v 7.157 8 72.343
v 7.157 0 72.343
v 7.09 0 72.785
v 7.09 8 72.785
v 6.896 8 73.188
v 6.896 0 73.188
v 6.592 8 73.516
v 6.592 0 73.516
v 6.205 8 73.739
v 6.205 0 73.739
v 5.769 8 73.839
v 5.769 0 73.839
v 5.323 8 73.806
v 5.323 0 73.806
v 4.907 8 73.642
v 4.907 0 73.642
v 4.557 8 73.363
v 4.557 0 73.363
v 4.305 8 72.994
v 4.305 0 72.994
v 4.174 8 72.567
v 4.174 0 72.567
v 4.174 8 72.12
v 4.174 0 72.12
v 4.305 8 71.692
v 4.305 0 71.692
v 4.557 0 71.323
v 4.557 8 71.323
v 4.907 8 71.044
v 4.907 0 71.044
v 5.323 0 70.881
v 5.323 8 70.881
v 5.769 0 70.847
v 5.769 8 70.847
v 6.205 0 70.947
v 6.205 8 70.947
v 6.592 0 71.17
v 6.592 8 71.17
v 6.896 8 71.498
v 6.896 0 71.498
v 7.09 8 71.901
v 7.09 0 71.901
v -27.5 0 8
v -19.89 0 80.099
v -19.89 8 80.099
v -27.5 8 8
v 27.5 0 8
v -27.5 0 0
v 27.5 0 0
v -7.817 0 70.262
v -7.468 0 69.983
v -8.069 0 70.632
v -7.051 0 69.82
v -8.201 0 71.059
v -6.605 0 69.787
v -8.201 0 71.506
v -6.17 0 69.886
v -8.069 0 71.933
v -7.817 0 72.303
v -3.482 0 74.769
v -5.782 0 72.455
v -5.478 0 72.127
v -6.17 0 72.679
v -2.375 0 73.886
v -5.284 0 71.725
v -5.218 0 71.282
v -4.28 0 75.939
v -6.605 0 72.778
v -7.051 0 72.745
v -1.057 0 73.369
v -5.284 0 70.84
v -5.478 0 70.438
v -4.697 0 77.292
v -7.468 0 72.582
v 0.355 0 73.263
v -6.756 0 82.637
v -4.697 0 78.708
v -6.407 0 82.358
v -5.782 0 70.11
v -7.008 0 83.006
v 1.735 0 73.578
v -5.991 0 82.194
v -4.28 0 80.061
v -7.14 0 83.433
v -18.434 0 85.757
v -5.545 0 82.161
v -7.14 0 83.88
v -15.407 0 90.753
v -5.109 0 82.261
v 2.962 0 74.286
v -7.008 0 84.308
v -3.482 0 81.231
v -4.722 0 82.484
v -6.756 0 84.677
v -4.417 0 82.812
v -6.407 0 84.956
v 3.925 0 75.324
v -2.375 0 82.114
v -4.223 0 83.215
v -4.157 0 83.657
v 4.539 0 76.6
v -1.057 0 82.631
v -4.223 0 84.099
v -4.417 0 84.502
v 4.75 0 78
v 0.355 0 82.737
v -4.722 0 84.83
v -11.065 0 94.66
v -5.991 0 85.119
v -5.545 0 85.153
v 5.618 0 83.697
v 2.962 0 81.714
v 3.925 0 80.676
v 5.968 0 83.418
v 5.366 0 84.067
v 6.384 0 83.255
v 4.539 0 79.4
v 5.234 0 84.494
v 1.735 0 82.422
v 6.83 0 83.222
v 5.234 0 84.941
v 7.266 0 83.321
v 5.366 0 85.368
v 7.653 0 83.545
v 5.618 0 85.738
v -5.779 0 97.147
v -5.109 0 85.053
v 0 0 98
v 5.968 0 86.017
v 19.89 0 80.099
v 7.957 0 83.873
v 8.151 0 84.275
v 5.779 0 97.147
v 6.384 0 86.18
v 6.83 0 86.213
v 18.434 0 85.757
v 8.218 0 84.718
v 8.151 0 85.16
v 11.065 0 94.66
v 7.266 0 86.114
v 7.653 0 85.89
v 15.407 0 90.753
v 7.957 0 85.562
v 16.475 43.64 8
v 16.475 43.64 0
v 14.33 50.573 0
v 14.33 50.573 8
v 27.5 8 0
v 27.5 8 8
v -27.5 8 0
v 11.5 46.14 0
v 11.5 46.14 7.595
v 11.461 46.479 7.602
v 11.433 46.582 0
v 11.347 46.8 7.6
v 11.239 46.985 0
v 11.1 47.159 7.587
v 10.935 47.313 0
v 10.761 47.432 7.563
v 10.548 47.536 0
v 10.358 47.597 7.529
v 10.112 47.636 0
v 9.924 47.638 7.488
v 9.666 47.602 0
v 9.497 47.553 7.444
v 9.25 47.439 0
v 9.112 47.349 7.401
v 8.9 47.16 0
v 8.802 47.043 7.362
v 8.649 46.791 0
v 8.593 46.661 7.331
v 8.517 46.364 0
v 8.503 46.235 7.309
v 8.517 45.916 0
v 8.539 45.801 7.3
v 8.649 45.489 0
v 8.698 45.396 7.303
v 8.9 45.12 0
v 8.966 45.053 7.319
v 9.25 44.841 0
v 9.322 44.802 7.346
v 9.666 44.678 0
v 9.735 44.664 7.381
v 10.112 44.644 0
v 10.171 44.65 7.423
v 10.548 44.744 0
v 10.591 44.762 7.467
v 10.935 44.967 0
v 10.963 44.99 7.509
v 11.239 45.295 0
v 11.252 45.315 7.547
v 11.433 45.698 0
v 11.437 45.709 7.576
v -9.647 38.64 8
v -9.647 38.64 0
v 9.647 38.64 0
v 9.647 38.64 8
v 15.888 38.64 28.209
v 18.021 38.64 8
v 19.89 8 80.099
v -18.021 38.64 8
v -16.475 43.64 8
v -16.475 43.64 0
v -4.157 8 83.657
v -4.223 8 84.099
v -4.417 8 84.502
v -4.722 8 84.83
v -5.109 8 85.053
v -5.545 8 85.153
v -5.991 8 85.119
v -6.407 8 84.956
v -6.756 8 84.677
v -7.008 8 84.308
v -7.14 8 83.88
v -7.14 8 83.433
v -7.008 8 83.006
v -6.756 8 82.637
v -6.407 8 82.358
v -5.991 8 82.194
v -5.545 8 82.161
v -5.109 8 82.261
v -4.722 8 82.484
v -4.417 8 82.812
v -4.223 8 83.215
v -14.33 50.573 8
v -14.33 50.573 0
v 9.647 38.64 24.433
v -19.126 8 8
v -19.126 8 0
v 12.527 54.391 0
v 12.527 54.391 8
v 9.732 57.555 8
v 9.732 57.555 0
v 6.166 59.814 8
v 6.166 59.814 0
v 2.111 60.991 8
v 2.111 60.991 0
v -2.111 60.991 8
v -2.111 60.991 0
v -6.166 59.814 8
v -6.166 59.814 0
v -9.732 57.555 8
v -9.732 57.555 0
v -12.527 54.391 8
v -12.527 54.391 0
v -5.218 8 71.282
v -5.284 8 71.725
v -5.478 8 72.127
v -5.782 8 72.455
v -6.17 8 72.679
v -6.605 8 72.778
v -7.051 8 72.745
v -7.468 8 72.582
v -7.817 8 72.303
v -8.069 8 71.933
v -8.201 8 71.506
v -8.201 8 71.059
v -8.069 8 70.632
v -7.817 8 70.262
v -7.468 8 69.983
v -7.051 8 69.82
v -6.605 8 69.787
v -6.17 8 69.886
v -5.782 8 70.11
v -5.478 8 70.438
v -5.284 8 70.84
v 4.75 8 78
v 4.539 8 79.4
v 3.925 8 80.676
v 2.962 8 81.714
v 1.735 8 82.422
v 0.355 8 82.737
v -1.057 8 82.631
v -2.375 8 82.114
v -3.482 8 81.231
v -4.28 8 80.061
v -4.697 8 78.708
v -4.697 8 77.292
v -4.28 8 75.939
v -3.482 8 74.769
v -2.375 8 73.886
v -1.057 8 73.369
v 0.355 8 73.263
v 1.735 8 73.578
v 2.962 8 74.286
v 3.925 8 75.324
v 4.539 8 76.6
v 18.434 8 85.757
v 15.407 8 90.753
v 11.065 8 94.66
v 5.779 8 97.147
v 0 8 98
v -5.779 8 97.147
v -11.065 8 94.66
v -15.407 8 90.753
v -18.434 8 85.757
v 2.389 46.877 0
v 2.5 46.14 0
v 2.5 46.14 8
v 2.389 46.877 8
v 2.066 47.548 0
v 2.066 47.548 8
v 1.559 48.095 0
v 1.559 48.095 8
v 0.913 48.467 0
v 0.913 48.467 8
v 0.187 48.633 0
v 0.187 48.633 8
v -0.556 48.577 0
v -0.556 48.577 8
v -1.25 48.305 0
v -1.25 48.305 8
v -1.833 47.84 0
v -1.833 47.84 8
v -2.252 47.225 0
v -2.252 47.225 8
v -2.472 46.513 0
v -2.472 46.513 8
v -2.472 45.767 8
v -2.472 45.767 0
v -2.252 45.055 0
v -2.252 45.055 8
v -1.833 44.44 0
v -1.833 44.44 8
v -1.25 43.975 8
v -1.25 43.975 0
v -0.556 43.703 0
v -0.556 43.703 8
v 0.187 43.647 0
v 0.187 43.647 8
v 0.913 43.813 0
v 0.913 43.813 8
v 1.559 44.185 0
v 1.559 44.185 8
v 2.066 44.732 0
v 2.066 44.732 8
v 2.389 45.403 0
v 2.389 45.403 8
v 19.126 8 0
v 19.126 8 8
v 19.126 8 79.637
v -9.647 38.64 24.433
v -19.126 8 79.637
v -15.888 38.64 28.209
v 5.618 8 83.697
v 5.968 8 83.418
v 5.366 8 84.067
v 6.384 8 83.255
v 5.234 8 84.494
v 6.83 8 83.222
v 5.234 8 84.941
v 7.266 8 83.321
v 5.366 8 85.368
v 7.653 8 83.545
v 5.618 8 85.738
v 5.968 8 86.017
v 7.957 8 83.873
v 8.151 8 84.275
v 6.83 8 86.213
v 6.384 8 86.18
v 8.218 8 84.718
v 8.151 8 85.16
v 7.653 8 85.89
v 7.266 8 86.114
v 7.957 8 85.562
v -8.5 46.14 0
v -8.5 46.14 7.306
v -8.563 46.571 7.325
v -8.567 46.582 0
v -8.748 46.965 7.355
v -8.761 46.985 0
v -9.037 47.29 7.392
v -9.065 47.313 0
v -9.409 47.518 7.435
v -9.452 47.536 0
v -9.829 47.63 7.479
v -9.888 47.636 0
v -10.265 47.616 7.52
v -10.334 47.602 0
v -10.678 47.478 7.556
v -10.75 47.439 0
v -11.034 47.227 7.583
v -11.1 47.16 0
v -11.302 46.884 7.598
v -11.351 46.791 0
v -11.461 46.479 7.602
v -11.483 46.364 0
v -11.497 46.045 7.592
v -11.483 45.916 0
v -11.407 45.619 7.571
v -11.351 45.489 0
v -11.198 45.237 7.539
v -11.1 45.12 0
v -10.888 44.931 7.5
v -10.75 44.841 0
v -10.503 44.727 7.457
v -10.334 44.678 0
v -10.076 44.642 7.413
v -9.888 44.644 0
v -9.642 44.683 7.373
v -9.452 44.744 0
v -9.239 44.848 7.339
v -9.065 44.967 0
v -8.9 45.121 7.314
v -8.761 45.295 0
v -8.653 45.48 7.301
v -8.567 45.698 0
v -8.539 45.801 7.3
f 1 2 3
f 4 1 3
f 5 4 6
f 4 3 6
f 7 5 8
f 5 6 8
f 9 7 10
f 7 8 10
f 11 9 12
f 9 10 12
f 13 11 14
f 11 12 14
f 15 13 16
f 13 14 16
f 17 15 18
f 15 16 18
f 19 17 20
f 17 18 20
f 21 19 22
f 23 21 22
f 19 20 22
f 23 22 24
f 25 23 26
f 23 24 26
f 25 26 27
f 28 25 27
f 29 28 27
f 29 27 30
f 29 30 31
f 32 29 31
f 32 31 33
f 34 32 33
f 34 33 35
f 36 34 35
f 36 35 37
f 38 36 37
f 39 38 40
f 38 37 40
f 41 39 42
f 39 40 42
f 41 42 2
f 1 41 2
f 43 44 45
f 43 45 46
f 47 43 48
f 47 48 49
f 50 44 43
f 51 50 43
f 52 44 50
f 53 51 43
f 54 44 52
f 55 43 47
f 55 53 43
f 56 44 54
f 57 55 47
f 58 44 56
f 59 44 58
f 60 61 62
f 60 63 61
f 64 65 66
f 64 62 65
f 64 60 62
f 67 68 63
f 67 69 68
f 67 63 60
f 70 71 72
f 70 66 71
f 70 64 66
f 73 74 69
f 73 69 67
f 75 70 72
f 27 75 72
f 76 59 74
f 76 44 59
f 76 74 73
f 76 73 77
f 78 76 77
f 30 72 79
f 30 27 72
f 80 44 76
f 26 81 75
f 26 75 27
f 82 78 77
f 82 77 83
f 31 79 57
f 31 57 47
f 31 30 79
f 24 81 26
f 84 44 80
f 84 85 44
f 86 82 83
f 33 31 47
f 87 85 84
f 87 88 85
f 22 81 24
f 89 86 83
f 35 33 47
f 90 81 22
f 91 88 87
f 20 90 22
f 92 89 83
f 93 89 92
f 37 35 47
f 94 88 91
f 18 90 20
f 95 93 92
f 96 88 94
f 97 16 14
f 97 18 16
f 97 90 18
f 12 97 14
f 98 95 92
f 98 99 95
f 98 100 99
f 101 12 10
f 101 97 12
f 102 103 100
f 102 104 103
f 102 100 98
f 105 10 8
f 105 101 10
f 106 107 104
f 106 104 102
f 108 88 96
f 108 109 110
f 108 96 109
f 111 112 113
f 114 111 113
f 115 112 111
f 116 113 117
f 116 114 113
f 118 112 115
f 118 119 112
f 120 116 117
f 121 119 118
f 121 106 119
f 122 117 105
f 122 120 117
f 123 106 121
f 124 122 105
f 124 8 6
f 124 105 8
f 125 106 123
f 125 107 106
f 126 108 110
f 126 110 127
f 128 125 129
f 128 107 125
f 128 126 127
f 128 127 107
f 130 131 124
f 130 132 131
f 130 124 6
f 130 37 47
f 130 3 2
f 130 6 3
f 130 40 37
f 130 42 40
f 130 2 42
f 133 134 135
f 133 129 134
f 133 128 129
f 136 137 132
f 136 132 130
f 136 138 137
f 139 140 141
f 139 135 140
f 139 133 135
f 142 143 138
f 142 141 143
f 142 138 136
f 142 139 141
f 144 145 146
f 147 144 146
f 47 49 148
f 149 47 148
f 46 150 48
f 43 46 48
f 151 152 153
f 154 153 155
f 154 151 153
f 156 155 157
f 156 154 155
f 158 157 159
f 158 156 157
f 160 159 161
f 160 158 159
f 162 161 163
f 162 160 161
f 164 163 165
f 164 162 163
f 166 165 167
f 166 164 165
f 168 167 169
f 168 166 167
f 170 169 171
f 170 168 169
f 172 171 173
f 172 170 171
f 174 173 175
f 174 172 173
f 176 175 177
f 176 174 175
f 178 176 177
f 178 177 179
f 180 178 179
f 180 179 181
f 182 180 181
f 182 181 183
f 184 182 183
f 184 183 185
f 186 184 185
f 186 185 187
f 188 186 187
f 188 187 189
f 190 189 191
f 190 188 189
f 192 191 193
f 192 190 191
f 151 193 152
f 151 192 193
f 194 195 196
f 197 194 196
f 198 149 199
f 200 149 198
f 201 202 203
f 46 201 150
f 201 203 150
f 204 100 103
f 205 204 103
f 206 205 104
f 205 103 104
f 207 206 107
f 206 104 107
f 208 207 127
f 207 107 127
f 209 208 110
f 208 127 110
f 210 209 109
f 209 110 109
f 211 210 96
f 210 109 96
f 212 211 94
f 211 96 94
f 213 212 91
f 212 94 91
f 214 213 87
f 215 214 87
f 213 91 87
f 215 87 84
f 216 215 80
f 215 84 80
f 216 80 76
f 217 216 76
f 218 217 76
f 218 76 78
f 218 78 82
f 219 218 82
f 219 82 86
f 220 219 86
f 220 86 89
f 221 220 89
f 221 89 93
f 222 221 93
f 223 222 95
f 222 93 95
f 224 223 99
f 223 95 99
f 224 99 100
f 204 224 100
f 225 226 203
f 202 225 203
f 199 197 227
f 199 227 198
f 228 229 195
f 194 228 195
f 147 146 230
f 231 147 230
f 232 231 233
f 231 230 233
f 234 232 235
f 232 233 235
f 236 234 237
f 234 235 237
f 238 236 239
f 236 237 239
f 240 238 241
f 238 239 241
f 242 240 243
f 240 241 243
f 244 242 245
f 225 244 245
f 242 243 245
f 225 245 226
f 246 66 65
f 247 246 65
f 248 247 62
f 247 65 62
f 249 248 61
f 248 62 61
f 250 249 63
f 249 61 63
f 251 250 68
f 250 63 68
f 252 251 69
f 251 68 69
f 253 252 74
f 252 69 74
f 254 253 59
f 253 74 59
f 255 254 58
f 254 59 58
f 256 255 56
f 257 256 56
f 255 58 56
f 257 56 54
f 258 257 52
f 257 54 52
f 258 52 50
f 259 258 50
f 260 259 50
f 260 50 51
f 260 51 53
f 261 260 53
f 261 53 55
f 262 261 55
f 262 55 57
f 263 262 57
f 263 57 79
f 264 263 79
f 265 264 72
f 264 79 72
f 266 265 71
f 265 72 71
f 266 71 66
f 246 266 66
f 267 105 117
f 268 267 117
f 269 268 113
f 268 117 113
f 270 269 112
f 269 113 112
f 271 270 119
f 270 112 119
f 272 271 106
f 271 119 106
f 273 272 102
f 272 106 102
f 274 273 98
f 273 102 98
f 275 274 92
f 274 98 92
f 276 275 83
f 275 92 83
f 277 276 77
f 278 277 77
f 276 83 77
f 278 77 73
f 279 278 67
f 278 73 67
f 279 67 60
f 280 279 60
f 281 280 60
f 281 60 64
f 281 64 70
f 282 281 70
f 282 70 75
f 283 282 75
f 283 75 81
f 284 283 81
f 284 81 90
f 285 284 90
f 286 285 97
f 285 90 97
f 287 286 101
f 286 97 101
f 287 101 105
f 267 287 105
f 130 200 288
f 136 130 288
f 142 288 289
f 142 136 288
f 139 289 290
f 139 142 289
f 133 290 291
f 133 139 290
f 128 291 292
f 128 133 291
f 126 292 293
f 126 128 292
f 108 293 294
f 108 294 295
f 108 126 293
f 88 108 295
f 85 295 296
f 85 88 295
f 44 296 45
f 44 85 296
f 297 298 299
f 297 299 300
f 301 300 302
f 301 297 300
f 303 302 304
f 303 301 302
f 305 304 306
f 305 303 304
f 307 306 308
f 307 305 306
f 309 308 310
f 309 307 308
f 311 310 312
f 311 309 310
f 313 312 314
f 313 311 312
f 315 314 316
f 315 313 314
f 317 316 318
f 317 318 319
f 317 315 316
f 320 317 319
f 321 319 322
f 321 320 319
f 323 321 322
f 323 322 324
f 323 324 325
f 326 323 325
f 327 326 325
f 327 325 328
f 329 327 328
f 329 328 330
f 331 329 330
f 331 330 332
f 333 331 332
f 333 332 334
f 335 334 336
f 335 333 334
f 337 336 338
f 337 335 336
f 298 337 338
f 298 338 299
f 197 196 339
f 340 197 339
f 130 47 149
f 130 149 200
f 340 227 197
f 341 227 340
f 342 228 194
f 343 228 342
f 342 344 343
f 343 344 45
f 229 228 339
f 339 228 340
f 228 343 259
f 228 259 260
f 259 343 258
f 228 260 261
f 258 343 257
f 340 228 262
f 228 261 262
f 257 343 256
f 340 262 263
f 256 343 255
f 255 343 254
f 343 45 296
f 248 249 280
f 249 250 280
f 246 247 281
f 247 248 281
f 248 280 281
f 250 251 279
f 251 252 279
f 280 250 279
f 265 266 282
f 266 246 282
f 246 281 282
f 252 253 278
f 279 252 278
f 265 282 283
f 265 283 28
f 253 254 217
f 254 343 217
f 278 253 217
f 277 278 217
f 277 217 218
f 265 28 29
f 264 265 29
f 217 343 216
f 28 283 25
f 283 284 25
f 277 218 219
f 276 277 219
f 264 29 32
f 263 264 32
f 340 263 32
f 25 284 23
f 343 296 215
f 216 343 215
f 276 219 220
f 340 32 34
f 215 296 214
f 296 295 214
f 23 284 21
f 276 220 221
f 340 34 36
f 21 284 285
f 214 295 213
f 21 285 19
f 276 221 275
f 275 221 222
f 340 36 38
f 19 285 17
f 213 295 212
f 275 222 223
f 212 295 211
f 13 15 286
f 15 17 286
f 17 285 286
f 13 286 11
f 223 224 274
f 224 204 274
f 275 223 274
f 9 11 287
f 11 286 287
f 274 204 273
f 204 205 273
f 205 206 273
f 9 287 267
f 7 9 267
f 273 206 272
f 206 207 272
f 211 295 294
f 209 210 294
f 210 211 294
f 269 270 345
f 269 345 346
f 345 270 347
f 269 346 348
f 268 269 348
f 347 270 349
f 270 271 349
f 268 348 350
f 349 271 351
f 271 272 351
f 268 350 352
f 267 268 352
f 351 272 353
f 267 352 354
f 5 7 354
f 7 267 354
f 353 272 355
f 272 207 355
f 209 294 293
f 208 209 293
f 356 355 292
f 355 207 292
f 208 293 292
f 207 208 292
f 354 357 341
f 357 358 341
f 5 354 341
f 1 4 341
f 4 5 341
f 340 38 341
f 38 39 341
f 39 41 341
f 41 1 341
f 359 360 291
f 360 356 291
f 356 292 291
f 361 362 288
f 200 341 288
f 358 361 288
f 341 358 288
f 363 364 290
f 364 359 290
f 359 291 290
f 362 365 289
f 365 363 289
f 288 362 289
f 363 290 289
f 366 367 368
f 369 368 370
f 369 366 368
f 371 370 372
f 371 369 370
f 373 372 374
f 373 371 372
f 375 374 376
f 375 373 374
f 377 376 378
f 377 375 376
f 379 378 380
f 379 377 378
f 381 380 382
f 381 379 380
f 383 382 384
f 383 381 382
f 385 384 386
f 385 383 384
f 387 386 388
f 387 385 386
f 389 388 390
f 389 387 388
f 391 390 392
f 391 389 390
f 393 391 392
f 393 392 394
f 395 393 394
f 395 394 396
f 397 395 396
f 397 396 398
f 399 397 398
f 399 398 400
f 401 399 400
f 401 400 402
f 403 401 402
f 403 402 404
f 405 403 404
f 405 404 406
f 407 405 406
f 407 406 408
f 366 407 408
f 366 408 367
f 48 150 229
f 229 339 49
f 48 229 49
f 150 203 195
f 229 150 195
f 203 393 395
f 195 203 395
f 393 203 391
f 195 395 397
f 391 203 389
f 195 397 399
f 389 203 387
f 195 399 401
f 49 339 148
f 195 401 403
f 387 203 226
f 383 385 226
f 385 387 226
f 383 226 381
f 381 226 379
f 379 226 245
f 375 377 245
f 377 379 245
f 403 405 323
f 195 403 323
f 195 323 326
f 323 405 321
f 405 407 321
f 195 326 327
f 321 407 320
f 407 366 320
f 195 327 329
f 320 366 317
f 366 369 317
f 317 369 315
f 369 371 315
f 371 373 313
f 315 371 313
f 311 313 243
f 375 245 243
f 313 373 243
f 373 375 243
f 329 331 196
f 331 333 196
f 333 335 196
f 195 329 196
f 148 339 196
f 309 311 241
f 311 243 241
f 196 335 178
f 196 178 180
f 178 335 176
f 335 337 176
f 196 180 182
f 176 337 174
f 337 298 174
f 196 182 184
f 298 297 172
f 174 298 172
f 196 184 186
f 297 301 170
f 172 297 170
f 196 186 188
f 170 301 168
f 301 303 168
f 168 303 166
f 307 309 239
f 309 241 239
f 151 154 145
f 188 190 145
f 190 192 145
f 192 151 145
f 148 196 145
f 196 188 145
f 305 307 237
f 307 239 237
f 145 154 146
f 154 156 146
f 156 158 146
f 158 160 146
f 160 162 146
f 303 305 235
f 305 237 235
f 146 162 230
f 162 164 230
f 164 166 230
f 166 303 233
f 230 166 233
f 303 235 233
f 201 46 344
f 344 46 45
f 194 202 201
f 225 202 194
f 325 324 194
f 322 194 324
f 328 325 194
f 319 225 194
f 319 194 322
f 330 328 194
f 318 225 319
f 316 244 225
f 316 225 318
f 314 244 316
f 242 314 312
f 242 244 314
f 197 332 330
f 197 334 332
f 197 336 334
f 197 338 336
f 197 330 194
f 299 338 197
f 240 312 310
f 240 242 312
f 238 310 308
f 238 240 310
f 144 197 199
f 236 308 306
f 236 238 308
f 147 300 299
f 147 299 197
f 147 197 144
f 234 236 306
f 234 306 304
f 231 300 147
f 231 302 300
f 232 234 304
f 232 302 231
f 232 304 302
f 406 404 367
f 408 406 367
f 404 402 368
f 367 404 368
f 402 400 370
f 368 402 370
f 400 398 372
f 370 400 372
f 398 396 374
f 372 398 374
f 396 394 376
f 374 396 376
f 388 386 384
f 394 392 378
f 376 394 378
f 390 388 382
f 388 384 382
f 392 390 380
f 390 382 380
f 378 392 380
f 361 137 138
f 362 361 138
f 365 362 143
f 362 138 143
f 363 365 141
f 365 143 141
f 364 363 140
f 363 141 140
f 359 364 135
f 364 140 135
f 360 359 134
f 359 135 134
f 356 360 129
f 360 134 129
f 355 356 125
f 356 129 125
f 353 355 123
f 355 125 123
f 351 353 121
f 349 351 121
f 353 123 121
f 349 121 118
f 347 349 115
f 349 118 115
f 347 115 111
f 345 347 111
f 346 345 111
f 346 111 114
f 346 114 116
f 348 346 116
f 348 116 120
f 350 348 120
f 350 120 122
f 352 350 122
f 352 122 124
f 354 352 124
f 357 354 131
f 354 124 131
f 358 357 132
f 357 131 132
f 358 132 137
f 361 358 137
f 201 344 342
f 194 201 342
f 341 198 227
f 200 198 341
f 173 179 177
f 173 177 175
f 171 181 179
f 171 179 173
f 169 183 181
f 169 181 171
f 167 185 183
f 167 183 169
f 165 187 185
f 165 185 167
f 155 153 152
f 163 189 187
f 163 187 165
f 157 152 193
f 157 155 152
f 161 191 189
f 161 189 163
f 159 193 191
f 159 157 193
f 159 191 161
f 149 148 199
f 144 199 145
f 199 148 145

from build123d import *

# Parameters (mm, degrees)
F0_R      = 1.5
F0_R_2    = 2.5
F1_DEPTH  = 8
F2_W      = 55
F2_H      = 8
F3_DEPTH  = 8
F4_R      = 4.75
F4_R_2    = 1.5
F5_DEPTH  = 8
F8_REACH  = 140.1940387091
F11_REACH = 140.1940387091
F13_DEPTH = 25


with BuildPart() as f1:
    # F0 (on Top) → F1 (new body)
    with BuildSketch(Plane.XY):
        Polygon((-27.5, 8), (-27.5, 0), (27.5, 0), (27.5, 8), (19.1259515677, 8), (-19.1259515677, 8), align=None)
        with BuildLine():
            Line((-16.4747191004, 43.64), (-27.5, 8))
            Line((-27.5, 8), (-19.1259515677, 8))
            Line((-19.1259515677, 8), (-9.6474272477, 38.64))
            Line((-9.6474272477, 38.64), (9.6474272477, 38.64))
            Line((9.6474272477, 38.64), (19.1259515677, 8))
            Line((19.1259515677, 8), (27.5, 8))
            Line((27.5, 8), (16.4747191004, 43.64))
            Line((16.4747191004, 43.64), (14.3299863823, 50.5730001446))
            ThreePointArc((14.3299863823, 50.5730001446), (0, 61.14), (-14.3299863823, 50.5730001446))
            Line((-14.3299863823, 50.5730001446), (-16.4747191004, 43.64))
        make_face()
        with Locations((-10, 46.14)):
            Circle(F0_R, mode=Mode.SUBTRACT)
        with Locations((0, 46.14)):
            Circle(F0_R_2, mode=Mode.SUBTRACT)
        with Locations((10, 46.14)):
            Circle(F0_R, mode=Mode.SUBTRACT)
    extrude(amount=F1_DEPTH)

    # F2 (on face) → F3 (join)
    with BuildSketch(Plane.XZ):
        with BuildLine():
            Line((27.5, 8), (19.8895027624, 80.0994475138))
            ThreePointArc((19.8895027624, 80.0994475138), (0, 98), (-19.8895027624, 80.0994475138))
            Line((-19.8895027624, 80.0994475138), (-27.5, 8))
            Line((-27.5, 8), (27.5, 8))
        make_face()
        with Locations((0, 4)):
            Rectangle(F2_W, F2_H)
    extrude(amount=-F3_DEPTH)

    # F4 (on face) → F5 (cut, through all)
    with BuildSketch(Plane.XZ):
        with Locations((0, 78)):
            Circle(F4_R)
        with Locations((-5.6568542495, 83.6568542495)):
            Circle(F4_R_2)
        with Locations((6.7175144213, 84.7175144213)):
            Circle(F4_R_2)
        with Locations((5.6568542495, 72.3431457505)):
            Circle(F4_R_2)
        with Locations((-6.7175144213, 71.2824855787)):
            Circle(F4_R_2)
    extrude(amount=-F5_DEPTH, mode=Mode.SUBTRACT)

    f8_end = Plane(origin=(14.3866894077, 23.32, 4), x_dir=(0.295533343, -0.9553324255, 0), z_dir=(-0.9553324255, -0.295533343, 0))
    # F7 (on 3pt) → F8 (join, up to a plane its end follows)
    with BuildSketch(Plane(origin=(27.8443578743, 8.6136887495, 2.9391266645), x_dir=(-0.2924175497, 0.9557924714, -0.0308662969), z_dir=(0.95051185, 0.2940420916, 0.1003318064))):
        Polygon((-0.6420732198, 77.5690607735), (-0.6420732198, 5.0690607735), (43.900022914, 6.4515483908), align=None)
    f8_long = extrude(amount=-F8_REACH, mode=Mode.PRIVATE)
    add(split(f8_long, bisect_by=f8_end, keep=Keep.BOTTOM, mode=Mode.PRIVATE))

    f11_end = Plane(origin=(-14.3866894077, 23.32, 4), x_dir=(0.295533343, 0.9553324255, 0), z_dir=(0.9553324255, -0.295533343, 0))
    # F10 (on 3pt) → F11 (join, up to a plane its end follows)
    with BuildSketch(Plane(origin=(-27.8443578743, 8.6136887495, 2.9391266645), x_dir=(0.2924175497, 0.9557924714, -0.0308662969), z_dir=(0.95051185, -0.2940420916, -0.1003318064))):
        Polygon((-0.6420732198, 77.5690607735), (-0.6420732198, 5.0690607735), (43.900022914, 6.4515483908), align=None)
    f11_long = extrude(amount=F11_REACH, mode=Mode.PRIVATE)
    add(split(f11_long, bisect_by=f11_end, keep=Keep.BOTTOM, mode=Mode.PRIVATE))

    # F12 (on face) → F13 (cut)
    with BuildSketch(Plane.XY.offset(8)):
        with BuildLine():
            Line((-18.02147568, 38.64), (-9.6474272477, 38.64))
            Line((-9.6474272477, 38.64), (9.6474272477, 38.64))
            Line((9.6474272477, 38.64), (18.02147568, 38.64))
            Line((18.02147568, 38.64), (14.3299863823, 50.5730001446))
            ThreePointArc((14.3299863823, 50.5730001446), (0, 61.14), (-14.3299863823, 50.5730001446))
            Line((-14.3299863823, 50.5730001446), (-18.02147568, 38.64))
        make_face()
    extrude(amount=F13_DEPTH, mode=Mode.SUBTRACT)


solid = f1.part
